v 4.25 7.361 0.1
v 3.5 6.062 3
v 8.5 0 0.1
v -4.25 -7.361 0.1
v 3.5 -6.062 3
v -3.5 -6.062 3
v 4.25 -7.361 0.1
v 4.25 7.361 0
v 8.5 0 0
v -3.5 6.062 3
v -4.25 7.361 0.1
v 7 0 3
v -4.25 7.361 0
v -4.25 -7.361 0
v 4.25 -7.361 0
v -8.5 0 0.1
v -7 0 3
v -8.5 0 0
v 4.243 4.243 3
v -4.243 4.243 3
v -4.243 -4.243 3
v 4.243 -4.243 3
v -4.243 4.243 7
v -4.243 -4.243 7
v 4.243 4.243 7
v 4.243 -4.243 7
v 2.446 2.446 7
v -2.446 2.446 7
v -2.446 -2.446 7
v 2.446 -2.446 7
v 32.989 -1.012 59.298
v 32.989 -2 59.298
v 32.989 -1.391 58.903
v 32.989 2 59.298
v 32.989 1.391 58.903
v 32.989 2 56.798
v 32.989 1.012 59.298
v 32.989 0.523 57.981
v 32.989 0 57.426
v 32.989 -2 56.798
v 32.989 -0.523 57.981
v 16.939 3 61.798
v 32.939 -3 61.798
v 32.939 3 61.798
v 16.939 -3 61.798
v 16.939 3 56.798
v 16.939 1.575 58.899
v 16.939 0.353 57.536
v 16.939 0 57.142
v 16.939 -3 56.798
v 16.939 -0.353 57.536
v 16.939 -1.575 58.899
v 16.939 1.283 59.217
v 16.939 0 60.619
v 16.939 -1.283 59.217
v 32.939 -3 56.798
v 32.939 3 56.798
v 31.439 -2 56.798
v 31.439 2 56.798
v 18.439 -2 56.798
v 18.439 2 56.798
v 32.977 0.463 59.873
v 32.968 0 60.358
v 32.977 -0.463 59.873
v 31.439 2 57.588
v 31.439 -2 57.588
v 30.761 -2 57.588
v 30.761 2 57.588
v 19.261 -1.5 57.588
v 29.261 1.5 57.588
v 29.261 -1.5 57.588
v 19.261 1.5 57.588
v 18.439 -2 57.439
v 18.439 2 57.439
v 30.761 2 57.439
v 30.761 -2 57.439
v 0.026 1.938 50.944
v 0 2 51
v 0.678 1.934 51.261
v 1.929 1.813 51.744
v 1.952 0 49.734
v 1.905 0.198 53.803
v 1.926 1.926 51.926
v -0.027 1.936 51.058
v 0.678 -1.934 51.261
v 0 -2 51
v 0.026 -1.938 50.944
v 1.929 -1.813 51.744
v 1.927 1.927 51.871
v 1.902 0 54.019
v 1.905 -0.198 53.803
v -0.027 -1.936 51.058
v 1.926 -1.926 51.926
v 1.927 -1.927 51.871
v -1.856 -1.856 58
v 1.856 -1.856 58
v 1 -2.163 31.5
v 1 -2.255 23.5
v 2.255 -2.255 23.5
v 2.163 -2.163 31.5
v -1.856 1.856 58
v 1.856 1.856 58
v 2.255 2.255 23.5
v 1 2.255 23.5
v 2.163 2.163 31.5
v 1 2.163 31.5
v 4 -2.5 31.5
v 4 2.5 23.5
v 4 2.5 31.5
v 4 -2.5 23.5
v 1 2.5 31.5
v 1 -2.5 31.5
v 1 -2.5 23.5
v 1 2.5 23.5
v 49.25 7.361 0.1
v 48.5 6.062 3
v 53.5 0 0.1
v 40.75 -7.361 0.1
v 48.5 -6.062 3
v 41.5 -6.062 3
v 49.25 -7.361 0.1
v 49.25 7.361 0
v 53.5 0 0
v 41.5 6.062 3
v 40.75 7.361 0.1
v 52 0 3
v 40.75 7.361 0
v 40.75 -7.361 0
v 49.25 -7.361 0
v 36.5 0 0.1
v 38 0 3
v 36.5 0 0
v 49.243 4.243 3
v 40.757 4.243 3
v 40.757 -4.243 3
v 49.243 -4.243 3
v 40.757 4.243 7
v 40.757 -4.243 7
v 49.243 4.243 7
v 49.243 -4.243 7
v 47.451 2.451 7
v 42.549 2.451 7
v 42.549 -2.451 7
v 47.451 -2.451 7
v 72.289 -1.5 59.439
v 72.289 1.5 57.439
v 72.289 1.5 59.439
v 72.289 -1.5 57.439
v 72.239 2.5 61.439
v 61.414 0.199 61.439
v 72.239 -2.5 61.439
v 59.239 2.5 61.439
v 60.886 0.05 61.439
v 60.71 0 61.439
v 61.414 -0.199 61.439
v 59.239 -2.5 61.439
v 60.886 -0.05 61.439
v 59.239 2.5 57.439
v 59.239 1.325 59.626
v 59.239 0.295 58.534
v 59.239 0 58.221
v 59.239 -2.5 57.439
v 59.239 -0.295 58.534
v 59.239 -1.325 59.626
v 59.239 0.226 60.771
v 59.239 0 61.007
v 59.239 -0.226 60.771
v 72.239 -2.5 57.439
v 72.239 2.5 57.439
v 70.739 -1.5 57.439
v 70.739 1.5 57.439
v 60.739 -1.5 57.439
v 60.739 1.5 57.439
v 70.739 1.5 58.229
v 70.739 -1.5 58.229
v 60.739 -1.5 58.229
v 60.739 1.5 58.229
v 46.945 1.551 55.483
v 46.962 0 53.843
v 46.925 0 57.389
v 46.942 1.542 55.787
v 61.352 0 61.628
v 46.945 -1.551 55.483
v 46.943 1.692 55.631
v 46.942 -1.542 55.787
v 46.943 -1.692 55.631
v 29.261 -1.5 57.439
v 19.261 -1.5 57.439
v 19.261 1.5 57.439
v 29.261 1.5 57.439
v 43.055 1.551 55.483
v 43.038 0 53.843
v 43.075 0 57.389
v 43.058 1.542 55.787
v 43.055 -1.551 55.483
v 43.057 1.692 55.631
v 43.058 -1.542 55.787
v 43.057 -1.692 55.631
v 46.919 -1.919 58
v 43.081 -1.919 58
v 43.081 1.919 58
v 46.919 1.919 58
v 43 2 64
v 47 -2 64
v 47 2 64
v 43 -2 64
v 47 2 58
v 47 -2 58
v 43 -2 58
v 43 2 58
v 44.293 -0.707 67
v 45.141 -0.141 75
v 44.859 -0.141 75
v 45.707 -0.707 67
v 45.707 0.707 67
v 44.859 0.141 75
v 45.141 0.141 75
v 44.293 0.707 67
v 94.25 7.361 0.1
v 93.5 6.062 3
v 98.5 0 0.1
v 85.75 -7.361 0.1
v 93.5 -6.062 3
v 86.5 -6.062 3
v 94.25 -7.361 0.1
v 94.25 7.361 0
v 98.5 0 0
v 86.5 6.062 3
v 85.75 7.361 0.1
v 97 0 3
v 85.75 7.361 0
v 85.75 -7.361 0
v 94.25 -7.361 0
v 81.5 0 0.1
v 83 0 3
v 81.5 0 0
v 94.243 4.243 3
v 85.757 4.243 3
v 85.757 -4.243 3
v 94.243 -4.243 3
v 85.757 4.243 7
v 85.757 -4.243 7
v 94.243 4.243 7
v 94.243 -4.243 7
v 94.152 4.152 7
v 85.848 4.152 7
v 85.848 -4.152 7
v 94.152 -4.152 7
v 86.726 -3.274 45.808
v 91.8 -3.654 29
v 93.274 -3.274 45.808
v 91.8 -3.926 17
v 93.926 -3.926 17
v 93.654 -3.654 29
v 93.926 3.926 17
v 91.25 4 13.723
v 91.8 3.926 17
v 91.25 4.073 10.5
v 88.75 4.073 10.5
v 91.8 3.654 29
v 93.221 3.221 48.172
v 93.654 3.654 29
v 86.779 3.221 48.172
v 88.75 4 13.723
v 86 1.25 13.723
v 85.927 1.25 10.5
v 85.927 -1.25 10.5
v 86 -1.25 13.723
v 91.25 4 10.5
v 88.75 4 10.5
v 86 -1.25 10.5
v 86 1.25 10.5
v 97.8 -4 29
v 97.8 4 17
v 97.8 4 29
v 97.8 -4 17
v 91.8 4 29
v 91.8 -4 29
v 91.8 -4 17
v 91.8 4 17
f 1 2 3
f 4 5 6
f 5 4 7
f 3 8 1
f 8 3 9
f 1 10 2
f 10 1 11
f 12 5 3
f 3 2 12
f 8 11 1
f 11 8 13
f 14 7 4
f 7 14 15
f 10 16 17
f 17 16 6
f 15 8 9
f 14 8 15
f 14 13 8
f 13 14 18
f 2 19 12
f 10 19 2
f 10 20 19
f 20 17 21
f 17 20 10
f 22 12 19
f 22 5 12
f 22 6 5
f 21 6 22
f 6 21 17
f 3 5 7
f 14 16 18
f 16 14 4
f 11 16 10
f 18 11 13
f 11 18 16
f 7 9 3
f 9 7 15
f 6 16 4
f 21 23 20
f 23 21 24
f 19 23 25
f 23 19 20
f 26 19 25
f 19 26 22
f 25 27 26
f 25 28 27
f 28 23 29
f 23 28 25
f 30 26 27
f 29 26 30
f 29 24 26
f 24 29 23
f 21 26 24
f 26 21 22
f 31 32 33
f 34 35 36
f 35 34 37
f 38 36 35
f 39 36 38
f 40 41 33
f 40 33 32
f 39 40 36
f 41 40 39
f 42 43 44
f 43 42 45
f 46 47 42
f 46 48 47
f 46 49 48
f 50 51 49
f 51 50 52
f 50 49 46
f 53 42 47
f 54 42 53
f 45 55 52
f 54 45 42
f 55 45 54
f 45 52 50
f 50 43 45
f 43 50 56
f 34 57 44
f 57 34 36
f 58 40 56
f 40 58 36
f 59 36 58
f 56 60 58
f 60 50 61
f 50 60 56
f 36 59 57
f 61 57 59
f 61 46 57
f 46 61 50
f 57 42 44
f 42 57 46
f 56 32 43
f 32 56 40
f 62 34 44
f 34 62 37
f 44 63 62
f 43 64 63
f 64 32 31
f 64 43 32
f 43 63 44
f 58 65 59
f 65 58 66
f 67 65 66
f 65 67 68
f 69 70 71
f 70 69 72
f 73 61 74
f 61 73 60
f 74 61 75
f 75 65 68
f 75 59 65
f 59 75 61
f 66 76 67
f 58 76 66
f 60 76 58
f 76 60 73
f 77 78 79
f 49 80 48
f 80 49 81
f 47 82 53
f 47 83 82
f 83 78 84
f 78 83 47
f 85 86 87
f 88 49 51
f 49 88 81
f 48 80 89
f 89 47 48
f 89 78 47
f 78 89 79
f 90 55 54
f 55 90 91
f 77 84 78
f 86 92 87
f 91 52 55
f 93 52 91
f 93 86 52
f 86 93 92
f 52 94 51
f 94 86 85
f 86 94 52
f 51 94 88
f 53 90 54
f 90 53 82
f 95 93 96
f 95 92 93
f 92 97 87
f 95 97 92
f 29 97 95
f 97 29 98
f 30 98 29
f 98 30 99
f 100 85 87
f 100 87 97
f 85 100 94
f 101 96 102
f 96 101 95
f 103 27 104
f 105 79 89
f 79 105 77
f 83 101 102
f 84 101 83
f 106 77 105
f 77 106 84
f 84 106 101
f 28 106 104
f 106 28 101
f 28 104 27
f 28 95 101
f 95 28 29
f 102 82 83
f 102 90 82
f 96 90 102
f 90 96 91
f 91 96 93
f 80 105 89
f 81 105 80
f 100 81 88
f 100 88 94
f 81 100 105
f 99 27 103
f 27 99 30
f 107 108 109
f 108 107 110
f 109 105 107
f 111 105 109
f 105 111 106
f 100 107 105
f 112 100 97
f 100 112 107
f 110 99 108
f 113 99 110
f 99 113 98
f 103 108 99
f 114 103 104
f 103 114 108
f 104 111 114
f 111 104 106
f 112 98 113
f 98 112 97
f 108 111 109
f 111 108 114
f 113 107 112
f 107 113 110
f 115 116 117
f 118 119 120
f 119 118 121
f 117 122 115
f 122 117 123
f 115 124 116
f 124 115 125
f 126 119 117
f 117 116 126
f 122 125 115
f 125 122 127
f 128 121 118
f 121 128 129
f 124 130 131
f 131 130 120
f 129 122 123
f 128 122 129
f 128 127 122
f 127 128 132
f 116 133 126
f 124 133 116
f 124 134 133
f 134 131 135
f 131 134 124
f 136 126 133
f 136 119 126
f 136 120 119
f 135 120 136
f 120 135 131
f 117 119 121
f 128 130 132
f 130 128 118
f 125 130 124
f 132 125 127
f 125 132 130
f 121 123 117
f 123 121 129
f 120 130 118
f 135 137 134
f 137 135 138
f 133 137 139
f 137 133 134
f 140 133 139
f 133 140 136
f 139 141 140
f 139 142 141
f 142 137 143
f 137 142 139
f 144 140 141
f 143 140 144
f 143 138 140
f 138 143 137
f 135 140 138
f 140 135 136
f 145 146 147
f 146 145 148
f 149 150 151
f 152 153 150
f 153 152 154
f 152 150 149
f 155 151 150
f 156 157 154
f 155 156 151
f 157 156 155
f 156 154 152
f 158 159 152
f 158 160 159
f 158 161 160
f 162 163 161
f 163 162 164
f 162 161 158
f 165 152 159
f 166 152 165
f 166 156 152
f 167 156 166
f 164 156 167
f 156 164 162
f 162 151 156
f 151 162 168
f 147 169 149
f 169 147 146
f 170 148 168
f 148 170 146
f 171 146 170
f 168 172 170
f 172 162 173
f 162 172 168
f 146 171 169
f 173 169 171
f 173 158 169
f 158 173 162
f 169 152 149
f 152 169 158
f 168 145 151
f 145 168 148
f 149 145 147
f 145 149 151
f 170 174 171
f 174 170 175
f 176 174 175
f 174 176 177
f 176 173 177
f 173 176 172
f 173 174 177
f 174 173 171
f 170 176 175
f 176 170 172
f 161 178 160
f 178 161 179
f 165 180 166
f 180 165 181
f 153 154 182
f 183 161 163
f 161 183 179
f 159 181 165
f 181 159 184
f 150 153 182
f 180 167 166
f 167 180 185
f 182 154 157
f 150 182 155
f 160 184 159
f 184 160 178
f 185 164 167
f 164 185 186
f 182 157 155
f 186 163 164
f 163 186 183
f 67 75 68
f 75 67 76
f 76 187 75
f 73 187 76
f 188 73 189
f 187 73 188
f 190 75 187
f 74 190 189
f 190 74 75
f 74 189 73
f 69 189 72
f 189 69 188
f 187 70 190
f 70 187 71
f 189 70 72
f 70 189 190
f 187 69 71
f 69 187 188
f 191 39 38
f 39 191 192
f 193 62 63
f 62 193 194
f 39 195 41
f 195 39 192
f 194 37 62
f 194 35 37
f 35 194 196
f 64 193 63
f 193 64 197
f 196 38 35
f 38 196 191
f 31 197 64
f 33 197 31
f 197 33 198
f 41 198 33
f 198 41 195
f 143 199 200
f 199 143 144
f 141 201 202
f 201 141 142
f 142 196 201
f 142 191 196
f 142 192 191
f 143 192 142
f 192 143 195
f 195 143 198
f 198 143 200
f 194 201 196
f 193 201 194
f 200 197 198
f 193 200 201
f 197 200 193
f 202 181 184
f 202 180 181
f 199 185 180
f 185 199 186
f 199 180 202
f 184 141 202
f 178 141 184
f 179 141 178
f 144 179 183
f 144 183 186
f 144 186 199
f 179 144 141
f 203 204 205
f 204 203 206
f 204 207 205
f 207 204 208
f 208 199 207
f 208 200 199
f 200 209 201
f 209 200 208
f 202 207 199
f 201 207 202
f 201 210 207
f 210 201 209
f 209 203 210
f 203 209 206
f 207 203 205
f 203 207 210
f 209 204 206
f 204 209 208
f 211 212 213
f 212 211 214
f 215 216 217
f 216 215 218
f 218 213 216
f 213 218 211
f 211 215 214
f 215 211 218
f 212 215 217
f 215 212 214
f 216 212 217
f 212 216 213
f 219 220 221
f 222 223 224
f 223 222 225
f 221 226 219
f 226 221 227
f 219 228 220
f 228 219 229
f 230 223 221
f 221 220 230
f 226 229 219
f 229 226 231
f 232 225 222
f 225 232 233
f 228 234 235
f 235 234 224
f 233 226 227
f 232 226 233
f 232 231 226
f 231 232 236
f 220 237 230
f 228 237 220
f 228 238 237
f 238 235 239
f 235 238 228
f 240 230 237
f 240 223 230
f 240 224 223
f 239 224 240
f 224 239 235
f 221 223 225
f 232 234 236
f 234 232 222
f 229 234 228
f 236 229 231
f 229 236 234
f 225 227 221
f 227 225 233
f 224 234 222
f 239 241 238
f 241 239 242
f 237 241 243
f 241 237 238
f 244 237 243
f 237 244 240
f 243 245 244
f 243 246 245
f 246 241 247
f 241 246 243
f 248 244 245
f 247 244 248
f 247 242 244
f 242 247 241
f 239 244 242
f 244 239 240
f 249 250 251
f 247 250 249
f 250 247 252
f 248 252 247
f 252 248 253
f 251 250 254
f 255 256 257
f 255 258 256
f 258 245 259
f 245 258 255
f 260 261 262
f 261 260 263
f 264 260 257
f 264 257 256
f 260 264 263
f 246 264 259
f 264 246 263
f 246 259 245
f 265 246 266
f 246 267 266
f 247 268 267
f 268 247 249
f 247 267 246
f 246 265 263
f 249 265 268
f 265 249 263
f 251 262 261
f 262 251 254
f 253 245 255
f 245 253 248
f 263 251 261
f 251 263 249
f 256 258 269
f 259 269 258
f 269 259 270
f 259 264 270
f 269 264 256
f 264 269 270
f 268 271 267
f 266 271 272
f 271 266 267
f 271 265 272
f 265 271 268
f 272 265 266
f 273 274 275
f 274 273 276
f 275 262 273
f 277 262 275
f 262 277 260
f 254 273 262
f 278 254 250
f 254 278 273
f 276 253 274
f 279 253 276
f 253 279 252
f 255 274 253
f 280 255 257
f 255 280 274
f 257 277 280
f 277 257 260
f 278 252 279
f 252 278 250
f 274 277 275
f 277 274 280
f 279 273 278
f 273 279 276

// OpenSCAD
// --- LumenTrace Cyberpunk Street Lamp Posts ---
// Kantige Sci-Fi-Strassenlaternen als Deko entlang der Bahn auf der
// schwarzen Platte. Passend zum Skyline-Stil (skyline_buildings.scad).
// Alle Masse in Millimetern (mm). Massstab passend zur Carrera-Bahn.
//
// Jede Laterne hat eine NUT bzw. eingelassene Flaeche als "LED-Leuchte".
// Mit transparentem Filament gedruckt leuchtet sie im Bahn-Ambiente mit.
// Alle Masten eckig (Diamant-/Quadrat-Querschnitt) fuer den kantigen Look.

// ============================ PARAMETER ============================
post_h      = 55;     // Hoehe des Mastes
post_w      = 5;      // Mast-Schluesselweite (eckig)
base_w      = 14;     // Grundplatte Breite
base_h      = 3;      // Grundplatte Hoehe
arm_len     = 22;     // Auslegerlaenge
glow_depth  = 0.8;    // Tiefe der Leucht-Nut
$fn         = 32;

// Welche Laterne: "lamp_a" | "lamp_b" | "lamp_c" | "all"
show_lamp = "all";

// ============================ HELFER ===============================

// Eckiger Mast (Diamant-Querschnitt), leicht verjuengt.
module post(h = post_h, w = post_w) {
    rotate([0, 0, 45])
        cylinder(h = h, d1 = w*1.41, d2 = w*1.05, $fn = 4);
}

// Kantige Grundplatte mit abgeschraegten Ecken + Tech-Sockel.
module base() {
    hull() {
        cylinder(h = base_h, d = base_w, $fn = 6);
        cylinder(h = 0.1, d = base_w + 3, $fn = 6);
    }
    // Tech-Sockel
    translate([0, 0, base_h]) rotate([0,0,45])
        cylinder(h = 4, d = post_w*2.4, $fn = 4);
}

// Leuchtkopf-Box mit eingelassener Glow-Flaeche an der Unterseite.
module lamp_head(l = 16, w = 6, t = 5) {
    difference() {
        // kantiger Kopf, vorne angeschraegt
        hull() {
            cube([l, w, t], center = true);
            translate([l/2, 0, -t/4]) cube([0.1, w-2, t/2], center = true);
        }
        // Glow-Nut unten
        translate([0, 0, -t/2 + glow_depth/2 - 0.01])
            cube([l - 3, w - 2, glow_depth], center = true);
    }
}

// ============================ LATERNEN =============================

// Lamp A — Klassischer Ausleger (single arm), kantig
module lamp_a() {
    union() {
        base();
        translate([0, 0, base_h]) post();
        // Auslegerarm schraeg nach oben
        translate([0, 0, post_h - 4]) {
            rotate([0, 65, 0])
                cylinder(h = arm_len, d1 = 4, d2 = 3, $fn = 4);
            // Leuchtkopf am Armende (rotate Z->X: x=h*sin, z=h*cos)
            arm_end_x = arm_len * sin(65);
            arm_end_z = arm_len * cos(65);
            translate([arm_end_x + 5, 0, arm_end_z - 1])
                lamp_head();
        }
        // kleine Tech-Box am Mast
        translate([post_w/2, 0, post_h*0.5]) cube([3, 5, 8], center = true);
    }
}

// Lamp B — Doppelausleger (beidseitig), symmetrisch
module lamp_b() {
    union() {
        base();
        translate([0, 0, base_h]) post(post_h + 6);
        for (m = [0, 1]) mirror([m, 0, 0])
            translate([0, 0, post_h]) {
                rotate([0, 72, 0])
                    cylinder(h = arm_len*0.8, d1 = 3.5, d2 = 2.5, $fn = 4);
                ax = arm_len*0.8 * sin(72);
                az = arm_len*0.8 * cos(72);
                translate([ax + 4, 0, az - 1]) lamp_head(13, 5, 4);
            }
        // Querstrebe / Funkmodul oben
        translate([0, 0, post_h + 6]) cube([4, 4, 6], center = true);
        translate([0, 0, post_h + 12]) rotate([0,0,45]) cylinder(h = 8, d1 = 2, d2 = 0.4, $fn = 4);
    }
}

// Lamp C — Monolith-Pylon mit vertikaler Leuchtleiste (sehr cyberpunk)
module lamp_c() {
    pw = 8; ph = 50;
    union() {
        base();
        difference() {
            // kantiger Pylon, oben schraeg angeschnitten
            difference() {
                translate([0, 0, base_h]) rotate([0,0,45])
                    cylinder(h = ph, d1 = pw*1.5, d2 = pw*1.1, $fn = 4);
                // schraeger Kopfschnitt
                translate([0, 0, base_h + ph - 6])
                    rotate([20, 0, 0]) translate([-20,-20,0]) cube([40,40,20]);
            }
            // vertikale Leucht-Nut auf zwei Seiten
            for (a = [0, 90])
                rotate([0,0,a])
                    translate([0, pw*0.6, base_h + ph/2])
                        cube([2.5, glow_depth*2, ph*0.7], center = true);
        }
        // auskragendes Tech-Modul
        translate([pw*0.6, 0, base_h + ph*0.4])
            cube([6, 8, 12], center = true);
    }
}

// ============================ AUSGABE =============================
if      (show_lamp == "lamp_a") lamp_a();
else if (show_lamp == "lamp_b") lamp_b();
else if (show_lamp == "lamp_c") lamp_c();
else {
    lamp_a();
    translate([45, 0, 0]) lamp_b();
    translate([90, 0, 0]) lamp_c();
}
